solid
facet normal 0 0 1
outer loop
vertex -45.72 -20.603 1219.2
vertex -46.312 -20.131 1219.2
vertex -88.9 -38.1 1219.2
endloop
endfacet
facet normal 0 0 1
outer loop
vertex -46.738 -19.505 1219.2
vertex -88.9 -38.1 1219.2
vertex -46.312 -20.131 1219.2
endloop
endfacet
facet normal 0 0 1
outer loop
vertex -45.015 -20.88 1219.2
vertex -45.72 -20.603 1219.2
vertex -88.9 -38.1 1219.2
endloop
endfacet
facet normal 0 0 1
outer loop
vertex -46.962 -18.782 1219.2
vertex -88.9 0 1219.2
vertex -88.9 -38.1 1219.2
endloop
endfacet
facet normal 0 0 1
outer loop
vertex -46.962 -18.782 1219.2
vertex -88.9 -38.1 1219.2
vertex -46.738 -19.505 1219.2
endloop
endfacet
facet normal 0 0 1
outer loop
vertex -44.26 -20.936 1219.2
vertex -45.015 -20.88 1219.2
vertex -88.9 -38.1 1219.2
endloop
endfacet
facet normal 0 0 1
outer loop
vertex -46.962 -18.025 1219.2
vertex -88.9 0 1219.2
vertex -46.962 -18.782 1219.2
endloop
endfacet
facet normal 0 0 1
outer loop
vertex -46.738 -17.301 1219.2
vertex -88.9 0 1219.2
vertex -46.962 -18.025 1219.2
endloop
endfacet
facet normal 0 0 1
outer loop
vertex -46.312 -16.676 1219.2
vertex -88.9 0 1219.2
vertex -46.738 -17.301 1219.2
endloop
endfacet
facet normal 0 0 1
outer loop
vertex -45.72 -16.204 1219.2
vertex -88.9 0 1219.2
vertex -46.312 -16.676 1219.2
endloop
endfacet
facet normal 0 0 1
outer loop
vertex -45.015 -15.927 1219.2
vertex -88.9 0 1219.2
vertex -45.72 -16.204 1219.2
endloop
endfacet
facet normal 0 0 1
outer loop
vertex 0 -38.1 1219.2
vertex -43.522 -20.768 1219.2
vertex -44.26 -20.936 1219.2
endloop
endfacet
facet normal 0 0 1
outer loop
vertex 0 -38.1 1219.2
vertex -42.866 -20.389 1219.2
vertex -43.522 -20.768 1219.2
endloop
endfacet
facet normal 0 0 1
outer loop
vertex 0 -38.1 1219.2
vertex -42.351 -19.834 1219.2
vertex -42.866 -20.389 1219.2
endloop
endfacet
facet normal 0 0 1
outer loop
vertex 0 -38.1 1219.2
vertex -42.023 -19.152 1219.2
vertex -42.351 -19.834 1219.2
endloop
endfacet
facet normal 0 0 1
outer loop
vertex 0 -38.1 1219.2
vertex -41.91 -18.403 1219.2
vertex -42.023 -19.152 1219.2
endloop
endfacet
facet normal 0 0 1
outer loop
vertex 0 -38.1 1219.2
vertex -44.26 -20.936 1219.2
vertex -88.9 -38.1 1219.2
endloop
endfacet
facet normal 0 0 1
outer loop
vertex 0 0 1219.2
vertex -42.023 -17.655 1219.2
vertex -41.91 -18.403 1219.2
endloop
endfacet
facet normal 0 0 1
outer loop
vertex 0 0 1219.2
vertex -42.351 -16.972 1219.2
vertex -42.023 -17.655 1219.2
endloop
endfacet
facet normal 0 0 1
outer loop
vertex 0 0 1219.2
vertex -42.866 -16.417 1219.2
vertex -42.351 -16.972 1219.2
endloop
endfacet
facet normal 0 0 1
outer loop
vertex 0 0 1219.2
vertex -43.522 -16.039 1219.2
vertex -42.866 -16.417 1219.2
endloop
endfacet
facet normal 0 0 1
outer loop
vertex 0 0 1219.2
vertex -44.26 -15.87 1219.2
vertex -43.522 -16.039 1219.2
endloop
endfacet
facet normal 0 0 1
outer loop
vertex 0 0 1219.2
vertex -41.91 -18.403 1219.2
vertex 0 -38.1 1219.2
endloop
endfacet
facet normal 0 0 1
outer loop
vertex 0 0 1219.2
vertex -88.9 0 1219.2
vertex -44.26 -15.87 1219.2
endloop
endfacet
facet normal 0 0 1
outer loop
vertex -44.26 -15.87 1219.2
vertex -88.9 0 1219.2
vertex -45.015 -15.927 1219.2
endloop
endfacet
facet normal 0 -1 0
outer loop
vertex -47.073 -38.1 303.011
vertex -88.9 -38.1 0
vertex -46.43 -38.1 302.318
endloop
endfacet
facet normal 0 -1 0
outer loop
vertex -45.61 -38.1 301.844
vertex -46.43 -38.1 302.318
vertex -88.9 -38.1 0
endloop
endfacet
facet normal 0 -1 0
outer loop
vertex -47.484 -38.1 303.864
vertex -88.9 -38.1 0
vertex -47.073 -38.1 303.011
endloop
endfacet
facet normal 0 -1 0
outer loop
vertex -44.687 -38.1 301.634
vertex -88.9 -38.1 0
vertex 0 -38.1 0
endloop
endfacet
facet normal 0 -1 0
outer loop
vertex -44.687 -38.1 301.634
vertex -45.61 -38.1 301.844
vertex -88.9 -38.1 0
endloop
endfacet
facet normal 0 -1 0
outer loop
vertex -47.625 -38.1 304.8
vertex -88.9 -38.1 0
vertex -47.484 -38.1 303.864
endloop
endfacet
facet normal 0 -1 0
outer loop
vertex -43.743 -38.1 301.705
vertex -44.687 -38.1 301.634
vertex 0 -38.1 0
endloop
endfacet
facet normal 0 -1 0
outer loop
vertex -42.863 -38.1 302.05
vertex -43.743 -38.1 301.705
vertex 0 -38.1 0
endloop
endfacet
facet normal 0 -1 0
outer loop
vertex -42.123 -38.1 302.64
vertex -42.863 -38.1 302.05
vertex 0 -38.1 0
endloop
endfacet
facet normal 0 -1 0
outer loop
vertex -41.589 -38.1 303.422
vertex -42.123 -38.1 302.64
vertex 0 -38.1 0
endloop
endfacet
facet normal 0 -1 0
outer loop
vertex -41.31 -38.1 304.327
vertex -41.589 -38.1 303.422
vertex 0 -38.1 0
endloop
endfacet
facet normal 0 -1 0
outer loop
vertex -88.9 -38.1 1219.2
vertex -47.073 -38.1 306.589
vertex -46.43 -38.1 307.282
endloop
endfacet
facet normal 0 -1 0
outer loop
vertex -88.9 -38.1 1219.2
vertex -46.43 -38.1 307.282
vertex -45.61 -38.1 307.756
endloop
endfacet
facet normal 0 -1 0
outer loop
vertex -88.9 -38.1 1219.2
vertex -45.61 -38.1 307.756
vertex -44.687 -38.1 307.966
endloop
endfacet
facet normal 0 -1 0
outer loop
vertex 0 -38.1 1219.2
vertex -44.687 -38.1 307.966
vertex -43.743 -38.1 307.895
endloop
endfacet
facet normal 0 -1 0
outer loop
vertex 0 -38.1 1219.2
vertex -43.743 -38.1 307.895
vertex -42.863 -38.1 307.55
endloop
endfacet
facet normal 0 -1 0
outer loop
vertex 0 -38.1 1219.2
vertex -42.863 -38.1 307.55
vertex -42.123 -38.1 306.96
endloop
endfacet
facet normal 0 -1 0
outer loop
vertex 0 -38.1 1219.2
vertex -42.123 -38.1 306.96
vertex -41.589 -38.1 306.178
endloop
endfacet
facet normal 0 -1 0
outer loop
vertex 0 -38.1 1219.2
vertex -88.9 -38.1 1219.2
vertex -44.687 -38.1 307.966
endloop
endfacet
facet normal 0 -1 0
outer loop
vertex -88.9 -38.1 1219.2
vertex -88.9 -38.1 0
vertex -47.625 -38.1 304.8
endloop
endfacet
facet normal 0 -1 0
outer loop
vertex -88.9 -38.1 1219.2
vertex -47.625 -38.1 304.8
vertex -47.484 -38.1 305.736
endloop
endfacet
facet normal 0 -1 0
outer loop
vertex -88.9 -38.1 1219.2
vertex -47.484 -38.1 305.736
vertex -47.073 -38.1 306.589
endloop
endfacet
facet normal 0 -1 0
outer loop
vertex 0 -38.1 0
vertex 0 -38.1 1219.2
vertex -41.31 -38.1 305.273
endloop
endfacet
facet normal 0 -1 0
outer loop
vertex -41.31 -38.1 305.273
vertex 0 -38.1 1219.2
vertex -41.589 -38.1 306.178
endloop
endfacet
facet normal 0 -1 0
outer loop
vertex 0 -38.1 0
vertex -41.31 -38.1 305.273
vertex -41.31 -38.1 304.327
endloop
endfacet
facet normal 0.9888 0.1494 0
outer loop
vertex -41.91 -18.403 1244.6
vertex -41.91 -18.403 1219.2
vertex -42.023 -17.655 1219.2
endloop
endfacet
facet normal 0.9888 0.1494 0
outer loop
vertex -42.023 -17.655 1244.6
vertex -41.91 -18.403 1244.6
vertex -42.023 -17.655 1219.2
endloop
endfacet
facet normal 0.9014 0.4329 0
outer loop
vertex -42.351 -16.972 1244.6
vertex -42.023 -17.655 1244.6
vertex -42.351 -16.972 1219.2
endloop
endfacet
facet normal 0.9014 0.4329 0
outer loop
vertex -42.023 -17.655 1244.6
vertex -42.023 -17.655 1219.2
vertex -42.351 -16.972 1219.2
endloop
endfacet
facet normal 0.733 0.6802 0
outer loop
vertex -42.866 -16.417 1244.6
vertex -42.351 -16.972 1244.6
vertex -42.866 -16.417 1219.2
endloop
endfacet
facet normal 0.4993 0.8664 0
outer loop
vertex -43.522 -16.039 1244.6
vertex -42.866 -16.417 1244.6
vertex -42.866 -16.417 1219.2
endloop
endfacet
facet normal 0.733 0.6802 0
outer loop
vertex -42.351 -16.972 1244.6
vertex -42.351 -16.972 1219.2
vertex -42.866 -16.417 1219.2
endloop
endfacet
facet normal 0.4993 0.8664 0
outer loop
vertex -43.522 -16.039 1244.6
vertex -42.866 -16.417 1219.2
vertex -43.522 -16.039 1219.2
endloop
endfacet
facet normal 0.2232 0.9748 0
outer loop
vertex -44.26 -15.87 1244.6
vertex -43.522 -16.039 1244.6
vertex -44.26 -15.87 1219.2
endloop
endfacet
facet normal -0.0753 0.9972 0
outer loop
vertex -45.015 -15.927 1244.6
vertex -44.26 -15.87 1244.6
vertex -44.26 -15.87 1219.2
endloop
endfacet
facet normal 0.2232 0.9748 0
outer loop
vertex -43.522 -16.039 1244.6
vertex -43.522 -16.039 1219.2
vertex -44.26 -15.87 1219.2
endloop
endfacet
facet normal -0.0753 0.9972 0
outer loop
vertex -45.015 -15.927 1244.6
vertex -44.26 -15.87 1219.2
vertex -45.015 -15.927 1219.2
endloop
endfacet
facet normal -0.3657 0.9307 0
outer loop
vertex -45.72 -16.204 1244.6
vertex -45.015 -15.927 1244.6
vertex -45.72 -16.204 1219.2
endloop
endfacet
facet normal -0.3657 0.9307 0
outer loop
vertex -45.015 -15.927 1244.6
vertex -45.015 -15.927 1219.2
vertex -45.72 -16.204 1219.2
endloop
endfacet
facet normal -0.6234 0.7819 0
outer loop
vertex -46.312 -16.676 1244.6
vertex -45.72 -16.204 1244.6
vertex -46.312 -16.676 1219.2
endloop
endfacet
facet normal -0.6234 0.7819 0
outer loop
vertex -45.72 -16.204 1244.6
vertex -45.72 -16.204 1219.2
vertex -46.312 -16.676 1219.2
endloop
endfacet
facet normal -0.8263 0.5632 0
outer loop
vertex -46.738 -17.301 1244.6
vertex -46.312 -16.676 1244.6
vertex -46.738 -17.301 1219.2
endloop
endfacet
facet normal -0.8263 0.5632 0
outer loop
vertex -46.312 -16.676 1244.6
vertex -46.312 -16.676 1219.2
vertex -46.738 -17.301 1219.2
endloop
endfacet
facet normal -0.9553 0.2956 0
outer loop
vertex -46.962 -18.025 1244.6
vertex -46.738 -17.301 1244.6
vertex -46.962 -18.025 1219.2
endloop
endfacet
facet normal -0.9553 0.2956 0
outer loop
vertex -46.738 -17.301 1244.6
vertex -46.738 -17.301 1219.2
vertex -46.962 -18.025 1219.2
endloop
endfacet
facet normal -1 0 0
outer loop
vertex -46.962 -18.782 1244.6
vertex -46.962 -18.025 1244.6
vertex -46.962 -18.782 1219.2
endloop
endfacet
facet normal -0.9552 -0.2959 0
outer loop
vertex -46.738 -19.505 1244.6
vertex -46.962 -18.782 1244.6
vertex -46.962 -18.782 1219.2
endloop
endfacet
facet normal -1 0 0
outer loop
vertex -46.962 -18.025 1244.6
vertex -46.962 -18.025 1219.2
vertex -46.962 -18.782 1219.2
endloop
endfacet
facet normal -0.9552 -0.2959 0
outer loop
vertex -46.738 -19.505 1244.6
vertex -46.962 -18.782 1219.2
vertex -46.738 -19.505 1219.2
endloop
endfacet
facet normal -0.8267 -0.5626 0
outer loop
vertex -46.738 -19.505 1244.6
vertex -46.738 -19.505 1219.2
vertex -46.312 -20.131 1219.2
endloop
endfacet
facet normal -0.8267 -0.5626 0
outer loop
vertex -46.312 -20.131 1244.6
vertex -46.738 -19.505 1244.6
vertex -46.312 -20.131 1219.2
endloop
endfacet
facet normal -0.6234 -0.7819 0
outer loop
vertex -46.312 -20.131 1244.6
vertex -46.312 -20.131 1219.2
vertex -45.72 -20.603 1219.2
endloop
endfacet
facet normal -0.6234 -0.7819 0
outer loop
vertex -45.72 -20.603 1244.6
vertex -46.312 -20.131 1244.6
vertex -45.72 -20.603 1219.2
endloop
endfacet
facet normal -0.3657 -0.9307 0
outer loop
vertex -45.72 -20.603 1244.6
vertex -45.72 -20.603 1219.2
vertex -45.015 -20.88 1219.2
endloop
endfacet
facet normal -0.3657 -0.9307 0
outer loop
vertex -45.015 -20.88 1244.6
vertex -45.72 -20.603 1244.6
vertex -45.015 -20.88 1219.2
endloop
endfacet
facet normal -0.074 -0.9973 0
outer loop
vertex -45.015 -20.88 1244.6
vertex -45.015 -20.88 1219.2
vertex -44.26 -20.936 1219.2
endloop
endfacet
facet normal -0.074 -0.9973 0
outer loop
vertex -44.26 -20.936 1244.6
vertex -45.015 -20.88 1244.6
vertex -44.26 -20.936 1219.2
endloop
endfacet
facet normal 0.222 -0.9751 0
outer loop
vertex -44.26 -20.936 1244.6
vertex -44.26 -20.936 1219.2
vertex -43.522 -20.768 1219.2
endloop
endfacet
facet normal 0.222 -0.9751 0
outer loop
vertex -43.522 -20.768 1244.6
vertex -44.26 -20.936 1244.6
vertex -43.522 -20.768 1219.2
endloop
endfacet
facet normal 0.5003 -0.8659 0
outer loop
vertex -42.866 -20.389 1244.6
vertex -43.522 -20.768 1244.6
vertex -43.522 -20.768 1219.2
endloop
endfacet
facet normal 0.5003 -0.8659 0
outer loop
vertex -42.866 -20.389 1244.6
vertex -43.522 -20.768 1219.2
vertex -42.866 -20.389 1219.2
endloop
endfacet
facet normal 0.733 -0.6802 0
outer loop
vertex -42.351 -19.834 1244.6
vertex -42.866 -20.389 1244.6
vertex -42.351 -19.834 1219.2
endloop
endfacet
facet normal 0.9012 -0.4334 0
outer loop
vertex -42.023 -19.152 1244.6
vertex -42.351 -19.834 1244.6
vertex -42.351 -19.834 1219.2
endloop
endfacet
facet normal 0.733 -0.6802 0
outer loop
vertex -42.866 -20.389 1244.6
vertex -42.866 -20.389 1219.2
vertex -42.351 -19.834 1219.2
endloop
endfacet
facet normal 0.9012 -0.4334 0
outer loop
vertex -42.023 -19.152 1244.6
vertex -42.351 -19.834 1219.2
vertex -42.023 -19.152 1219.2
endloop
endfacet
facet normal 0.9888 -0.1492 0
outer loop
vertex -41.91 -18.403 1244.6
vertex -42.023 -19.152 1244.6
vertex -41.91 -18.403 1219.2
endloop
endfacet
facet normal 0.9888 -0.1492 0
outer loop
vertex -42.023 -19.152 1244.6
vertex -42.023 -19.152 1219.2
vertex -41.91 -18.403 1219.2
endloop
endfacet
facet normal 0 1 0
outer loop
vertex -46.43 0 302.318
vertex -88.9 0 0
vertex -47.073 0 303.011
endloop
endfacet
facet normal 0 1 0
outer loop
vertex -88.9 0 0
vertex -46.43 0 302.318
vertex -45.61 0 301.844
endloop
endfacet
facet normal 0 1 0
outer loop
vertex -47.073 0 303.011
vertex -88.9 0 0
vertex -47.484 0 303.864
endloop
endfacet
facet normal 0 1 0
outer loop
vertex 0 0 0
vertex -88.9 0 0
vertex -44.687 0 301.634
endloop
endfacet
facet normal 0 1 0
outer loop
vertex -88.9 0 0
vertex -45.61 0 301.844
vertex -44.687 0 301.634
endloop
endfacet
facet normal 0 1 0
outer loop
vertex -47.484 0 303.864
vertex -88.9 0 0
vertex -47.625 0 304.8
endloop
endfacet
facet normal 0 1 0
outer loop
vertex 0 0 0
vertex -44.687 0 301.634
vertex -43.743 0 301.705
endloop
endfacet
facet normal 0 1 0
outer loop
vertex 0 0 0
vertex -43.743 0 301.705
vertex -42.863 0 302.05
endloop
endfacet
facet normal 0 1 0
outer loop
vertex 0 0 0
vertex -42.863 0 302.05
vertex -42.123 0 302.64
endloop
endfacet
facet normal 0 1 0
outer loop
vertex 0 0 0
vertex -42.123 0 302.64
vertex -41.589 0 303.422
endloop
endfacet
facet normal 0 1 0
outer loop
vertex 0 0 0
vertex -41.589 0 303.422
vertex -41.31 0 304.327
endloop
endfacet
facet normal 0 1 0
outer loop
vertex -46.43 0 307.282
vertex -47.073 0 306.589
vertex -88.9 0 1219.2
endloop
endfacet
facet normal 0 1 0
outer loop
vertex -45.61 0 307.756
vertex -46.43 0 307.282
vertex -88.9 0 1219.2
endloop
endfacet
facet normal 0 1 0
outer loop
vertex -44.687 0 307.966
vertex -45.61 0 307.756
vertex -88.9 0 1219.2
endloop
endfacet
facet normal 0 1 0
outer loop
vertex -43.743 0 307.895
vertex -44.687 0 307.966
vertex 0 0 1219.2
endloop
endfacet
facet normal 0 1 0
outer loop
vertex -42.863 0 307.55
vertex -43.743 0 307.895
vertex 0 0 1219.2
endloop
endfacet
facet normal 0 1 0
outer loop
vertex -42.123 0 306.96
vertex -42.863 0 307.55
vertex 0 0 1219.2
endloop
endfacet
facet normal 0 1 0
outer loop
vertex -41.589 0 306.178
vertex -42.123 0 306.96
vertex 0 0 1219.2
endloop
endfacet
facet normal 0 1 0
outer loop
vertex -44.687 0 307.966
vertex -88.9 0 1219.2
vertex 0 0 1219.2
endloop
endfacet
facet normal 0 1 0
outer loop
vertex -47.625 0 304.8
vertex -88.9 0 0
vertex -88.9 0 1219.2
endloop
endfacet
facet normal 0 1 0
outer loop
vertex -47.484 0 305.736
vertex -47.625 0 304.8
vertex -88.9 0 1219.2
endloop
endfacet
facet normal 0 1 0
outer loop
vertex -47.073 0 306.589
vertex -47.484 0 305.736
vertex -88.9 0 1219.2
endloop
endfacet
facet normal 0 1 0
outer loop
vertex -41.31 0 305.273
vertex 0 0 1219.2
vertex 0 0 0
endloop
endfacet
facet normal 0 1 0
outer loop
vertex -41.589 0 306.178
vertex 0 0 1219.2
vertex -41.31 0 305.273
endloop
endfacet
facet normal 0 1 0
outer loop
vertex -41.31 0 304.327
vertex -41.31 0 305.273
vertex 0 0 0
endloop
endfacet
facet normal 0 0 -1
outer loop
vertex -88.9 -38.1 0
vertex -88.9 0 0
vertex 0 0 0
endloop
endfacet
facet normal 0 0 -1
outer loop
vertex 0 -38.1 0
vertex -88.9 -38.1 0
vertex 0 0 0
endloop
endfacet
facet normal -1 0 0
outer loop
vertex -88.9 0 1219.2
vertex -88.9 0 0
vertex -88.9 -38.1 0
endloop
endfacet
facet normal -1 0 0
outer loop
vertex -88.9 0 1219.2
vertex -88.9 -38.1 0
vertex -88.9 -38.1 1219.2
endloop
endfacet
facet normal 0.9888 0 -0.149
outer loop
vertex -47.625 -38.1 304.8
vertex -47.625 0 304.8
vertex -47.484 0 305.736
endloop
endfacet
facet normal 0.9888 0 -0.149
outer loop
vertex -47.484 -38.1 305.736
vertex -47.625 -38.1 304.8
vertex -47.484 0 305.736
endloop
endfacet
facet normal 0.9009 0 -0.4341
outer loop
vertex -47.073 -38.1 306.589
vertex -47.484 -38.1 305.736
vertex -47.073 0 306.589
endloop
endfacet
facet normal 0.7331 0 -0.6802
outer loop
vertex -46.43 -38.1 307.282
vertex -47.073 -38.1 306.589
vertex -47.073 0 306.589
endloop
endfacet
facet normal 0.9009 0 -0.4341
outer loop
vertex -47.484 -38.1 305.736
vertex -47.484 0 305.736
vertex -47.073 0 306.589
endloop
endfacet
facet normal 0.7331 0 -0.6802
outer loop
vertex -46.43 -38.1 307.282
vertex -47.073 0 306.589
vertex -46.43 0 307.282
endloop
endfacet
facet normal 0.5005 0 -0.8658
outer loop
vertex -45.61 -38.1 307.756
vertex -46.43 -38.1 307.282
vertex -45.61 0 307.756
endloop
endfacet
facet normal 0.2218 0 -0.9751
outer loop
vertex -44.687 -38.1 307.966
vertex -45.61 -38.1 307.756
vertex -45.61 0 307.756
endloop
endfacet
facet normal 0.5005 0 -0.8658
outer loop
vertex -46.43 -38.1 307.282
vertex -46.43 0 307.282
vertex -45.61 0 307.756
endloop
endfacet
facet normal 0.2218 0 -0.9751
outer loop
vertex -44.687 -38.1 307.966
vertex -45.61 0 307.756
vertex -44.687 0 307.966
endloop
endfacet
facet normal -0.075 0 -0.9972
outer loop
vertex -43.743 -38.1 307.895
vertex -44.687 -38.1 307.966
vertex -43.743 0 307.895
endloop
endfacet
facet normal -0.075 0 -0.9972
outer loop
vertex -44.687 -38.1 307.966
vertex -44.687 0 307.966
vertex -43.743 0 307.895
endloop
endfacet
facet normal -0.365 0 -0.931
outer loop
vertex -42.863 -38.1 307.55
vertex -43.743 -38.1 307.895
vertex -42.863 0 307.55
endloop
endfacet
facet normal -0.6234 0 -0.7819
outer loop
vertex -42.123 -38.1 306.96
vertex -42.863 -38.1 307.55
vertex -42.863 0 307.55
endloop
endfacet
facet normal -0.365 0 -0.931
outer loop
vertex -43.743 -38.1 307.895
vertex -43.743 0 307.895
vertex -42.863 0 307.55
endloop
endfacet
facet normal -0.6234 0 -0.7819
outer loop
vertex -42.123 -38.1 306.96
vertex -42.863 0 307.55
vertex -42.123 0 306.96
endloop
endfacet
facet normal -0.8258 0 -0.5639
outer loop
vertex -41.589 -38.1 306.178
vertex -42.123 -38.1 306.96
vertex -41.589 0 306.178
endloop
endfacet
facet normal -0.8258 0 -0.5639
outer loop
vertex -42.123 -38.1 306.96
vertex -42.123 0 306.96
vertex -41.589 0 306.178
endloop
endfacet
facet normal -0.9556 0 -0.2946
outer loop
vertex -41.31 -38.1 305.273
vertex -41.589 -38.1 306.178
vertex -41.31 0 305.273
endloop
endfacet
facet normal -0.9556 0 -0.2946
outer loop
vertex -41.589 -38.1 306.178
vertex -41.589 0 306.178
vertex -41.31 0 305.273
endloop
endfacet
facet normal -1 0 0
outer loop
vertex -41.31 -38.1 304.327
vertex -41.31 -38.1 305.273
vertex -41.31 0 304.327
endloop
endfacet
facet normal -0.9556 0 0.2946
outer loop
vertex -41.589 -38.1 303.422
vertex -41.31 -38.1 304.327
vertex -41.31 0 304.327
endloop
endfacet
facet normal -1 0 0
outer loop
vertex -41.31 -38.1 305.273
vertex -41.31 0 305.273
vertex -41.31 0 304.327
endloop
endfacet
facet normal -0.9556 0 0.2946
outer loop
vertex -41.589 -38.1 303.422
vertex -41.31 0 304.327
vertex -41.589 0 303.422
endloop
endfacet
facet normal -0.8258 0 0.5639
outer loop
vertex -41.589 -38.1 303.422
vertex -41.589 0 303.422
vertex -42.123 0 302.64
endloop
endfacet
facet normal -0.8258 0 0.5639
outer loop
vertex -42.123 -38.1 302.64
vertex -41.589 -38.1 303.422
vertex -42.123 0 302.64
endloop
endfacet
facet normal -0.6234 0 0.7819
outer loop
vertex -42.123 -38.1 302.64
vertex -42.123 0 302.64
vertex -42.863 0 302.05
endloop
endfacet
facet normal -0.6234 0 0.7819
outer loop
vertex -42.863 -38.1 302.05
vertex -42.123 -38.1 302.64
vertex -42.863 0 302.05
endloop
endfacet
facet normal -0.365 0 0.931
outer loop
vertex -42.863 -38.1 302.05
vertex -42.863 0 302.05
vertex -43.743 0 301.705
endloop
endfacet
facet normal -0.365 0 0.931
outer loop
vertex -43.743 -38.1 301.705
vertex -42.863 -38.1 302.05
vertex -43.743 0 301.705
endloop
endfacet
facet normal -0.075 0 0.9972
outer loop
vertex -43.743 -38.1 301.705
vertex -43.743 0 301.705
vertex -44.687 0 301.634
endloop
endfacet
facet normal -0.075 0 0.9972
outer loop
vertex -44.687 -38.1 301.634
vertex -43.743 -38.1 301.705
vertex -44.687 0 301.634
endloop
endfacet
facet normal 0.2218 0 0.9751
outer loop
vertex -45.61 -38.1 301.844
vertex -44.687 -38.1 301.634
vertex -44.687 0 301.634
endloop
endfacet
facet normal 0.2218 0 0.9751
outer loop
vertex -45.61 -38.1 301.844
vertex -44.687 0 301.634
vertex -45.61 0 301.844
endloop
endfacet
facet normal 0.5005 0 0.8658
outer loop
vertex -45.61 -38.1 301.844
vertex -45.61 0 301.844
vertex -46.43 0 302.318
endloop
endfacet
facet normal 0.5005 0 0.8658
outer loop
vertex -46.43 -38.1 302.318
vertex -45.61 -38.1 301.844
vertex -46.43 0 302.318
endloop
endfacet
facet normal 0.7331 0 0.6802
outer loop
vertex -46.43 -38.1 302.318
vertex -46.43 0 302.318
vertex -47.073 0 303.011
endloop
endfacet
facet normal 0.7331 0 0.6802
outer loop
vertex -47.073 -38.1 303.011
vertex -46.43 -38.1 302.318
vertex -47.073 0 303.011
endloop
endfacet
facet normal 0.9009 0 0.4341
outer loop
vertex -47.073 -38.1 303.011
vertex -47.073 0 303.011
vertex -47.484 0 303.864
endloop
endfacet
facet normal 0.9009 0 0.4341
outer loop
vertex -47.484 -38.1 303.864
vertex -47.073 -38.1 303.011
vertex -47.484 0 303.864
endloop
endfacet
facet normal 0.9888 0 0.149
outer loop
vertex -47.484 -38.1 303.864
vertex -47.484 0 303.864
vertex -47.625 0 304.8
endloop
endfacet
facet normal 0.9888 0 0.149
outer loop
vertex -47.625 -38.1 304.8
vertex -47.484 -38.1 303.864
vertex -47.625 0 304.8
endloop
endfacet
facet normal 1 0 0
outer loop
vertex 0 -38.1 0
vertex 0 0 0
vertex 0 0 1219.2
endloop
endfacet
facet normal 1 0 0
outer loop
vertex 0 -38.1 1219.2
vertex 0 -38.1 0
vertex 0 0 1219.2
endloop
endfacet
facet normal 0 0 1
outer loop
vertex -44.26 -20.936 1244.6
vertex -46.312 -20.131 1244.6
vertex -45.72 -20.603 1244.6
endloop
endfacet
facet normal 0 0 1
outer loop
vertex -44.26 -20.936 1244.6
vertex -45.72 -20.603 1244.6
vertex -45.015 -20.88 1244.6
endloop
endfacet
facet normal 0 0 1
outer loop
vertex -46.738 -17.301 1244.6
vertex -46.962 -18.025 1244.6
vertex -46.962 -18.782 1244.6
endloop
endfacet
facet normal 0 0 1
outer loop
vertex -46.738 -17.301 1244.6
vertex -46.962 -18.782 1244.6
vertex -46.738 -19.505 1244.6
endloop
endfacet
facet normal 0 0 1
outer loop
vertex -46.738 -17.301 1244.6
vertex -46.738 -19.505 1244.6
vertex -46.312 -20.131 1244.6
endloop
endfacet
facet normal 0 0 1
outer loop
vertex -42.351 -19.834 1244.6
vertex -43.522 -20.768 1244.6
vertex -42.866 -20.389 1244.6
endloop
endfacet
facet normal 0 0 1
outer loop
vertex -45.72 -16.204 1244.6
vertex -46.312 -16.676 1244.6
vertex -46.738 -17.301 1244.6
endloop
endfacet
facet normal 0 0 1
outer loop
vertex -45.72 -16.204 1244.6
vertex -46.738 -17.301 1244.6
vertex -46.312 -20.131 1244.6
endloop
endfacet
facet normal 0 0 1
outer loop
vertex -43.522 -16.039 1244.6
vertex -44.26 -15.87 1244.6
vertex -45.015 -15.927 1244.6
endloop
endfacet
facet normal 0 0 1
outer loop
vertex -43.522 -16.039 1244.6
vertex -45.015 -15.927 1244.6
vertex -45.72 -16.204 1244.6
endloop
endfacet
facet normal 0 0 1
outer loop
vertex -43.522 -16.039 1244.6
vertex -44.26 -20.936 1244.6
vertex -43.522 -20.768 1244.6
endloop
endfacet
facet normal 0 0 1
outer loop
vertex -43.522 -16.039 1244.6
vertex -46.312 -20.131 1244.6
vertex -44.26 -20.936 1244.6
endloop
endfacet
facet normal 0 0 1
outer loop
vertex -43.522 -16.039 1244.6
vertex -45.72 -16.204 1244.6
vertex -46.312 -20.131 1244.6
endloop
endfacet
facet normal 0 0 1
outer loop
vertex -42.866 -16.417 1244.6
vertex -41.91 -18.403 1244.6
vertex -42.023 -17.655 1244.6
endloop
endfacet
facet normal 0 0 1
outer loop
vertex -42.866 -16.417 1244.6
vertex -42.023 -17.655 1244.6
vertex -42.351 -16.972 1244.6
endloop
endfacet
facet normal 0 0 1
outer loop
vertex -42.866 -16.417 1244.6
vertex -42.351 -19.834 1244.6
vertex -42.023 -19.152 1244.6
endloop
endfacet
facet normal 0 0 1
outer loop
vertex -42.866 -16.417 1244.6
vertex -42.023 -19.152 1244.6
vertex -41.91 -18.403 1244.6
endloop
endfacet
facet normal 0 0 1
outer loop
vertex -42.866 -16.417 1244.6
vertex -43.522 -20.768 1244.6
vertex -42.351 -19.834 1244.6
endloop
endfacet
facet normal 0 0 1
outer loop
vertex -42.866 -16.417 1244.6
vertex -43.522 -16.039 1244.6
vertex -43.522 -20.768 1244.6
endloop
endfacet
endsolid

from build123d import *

# Parameters (mm, degrees)
F0_W     = 88.9
F0_H     = 1219.2
F1_DEPTH = 38.1
F3_D     = 6.35
F4_R     = 2.54
F5_DEPTH = 25.4


with BuildPart() as f1:
    # F0 (on Front) → F1 (new body)
    with BuildSketch(Plane.XZ):
        with Locations((-44.45, 609.6)):
            Rectangle(F0_W, F0_H)
    extrude(amount=F1_DEPTH)

    # F3 (through all)
    with Locations(Plane.XZ.offset(38.1)):
        with Locations((-44.45, 304.8)):
            Hole(F3_D / 2)

    # F4 (on face) → F5 (join)
    with BuildSketch(Plane.XY.offset(1219.2)):
        with Locations((-44.45, -18.403284)):
            Circle(F4_R)
    extrude(amount=F5_DEPTH)


solid = f1.part
